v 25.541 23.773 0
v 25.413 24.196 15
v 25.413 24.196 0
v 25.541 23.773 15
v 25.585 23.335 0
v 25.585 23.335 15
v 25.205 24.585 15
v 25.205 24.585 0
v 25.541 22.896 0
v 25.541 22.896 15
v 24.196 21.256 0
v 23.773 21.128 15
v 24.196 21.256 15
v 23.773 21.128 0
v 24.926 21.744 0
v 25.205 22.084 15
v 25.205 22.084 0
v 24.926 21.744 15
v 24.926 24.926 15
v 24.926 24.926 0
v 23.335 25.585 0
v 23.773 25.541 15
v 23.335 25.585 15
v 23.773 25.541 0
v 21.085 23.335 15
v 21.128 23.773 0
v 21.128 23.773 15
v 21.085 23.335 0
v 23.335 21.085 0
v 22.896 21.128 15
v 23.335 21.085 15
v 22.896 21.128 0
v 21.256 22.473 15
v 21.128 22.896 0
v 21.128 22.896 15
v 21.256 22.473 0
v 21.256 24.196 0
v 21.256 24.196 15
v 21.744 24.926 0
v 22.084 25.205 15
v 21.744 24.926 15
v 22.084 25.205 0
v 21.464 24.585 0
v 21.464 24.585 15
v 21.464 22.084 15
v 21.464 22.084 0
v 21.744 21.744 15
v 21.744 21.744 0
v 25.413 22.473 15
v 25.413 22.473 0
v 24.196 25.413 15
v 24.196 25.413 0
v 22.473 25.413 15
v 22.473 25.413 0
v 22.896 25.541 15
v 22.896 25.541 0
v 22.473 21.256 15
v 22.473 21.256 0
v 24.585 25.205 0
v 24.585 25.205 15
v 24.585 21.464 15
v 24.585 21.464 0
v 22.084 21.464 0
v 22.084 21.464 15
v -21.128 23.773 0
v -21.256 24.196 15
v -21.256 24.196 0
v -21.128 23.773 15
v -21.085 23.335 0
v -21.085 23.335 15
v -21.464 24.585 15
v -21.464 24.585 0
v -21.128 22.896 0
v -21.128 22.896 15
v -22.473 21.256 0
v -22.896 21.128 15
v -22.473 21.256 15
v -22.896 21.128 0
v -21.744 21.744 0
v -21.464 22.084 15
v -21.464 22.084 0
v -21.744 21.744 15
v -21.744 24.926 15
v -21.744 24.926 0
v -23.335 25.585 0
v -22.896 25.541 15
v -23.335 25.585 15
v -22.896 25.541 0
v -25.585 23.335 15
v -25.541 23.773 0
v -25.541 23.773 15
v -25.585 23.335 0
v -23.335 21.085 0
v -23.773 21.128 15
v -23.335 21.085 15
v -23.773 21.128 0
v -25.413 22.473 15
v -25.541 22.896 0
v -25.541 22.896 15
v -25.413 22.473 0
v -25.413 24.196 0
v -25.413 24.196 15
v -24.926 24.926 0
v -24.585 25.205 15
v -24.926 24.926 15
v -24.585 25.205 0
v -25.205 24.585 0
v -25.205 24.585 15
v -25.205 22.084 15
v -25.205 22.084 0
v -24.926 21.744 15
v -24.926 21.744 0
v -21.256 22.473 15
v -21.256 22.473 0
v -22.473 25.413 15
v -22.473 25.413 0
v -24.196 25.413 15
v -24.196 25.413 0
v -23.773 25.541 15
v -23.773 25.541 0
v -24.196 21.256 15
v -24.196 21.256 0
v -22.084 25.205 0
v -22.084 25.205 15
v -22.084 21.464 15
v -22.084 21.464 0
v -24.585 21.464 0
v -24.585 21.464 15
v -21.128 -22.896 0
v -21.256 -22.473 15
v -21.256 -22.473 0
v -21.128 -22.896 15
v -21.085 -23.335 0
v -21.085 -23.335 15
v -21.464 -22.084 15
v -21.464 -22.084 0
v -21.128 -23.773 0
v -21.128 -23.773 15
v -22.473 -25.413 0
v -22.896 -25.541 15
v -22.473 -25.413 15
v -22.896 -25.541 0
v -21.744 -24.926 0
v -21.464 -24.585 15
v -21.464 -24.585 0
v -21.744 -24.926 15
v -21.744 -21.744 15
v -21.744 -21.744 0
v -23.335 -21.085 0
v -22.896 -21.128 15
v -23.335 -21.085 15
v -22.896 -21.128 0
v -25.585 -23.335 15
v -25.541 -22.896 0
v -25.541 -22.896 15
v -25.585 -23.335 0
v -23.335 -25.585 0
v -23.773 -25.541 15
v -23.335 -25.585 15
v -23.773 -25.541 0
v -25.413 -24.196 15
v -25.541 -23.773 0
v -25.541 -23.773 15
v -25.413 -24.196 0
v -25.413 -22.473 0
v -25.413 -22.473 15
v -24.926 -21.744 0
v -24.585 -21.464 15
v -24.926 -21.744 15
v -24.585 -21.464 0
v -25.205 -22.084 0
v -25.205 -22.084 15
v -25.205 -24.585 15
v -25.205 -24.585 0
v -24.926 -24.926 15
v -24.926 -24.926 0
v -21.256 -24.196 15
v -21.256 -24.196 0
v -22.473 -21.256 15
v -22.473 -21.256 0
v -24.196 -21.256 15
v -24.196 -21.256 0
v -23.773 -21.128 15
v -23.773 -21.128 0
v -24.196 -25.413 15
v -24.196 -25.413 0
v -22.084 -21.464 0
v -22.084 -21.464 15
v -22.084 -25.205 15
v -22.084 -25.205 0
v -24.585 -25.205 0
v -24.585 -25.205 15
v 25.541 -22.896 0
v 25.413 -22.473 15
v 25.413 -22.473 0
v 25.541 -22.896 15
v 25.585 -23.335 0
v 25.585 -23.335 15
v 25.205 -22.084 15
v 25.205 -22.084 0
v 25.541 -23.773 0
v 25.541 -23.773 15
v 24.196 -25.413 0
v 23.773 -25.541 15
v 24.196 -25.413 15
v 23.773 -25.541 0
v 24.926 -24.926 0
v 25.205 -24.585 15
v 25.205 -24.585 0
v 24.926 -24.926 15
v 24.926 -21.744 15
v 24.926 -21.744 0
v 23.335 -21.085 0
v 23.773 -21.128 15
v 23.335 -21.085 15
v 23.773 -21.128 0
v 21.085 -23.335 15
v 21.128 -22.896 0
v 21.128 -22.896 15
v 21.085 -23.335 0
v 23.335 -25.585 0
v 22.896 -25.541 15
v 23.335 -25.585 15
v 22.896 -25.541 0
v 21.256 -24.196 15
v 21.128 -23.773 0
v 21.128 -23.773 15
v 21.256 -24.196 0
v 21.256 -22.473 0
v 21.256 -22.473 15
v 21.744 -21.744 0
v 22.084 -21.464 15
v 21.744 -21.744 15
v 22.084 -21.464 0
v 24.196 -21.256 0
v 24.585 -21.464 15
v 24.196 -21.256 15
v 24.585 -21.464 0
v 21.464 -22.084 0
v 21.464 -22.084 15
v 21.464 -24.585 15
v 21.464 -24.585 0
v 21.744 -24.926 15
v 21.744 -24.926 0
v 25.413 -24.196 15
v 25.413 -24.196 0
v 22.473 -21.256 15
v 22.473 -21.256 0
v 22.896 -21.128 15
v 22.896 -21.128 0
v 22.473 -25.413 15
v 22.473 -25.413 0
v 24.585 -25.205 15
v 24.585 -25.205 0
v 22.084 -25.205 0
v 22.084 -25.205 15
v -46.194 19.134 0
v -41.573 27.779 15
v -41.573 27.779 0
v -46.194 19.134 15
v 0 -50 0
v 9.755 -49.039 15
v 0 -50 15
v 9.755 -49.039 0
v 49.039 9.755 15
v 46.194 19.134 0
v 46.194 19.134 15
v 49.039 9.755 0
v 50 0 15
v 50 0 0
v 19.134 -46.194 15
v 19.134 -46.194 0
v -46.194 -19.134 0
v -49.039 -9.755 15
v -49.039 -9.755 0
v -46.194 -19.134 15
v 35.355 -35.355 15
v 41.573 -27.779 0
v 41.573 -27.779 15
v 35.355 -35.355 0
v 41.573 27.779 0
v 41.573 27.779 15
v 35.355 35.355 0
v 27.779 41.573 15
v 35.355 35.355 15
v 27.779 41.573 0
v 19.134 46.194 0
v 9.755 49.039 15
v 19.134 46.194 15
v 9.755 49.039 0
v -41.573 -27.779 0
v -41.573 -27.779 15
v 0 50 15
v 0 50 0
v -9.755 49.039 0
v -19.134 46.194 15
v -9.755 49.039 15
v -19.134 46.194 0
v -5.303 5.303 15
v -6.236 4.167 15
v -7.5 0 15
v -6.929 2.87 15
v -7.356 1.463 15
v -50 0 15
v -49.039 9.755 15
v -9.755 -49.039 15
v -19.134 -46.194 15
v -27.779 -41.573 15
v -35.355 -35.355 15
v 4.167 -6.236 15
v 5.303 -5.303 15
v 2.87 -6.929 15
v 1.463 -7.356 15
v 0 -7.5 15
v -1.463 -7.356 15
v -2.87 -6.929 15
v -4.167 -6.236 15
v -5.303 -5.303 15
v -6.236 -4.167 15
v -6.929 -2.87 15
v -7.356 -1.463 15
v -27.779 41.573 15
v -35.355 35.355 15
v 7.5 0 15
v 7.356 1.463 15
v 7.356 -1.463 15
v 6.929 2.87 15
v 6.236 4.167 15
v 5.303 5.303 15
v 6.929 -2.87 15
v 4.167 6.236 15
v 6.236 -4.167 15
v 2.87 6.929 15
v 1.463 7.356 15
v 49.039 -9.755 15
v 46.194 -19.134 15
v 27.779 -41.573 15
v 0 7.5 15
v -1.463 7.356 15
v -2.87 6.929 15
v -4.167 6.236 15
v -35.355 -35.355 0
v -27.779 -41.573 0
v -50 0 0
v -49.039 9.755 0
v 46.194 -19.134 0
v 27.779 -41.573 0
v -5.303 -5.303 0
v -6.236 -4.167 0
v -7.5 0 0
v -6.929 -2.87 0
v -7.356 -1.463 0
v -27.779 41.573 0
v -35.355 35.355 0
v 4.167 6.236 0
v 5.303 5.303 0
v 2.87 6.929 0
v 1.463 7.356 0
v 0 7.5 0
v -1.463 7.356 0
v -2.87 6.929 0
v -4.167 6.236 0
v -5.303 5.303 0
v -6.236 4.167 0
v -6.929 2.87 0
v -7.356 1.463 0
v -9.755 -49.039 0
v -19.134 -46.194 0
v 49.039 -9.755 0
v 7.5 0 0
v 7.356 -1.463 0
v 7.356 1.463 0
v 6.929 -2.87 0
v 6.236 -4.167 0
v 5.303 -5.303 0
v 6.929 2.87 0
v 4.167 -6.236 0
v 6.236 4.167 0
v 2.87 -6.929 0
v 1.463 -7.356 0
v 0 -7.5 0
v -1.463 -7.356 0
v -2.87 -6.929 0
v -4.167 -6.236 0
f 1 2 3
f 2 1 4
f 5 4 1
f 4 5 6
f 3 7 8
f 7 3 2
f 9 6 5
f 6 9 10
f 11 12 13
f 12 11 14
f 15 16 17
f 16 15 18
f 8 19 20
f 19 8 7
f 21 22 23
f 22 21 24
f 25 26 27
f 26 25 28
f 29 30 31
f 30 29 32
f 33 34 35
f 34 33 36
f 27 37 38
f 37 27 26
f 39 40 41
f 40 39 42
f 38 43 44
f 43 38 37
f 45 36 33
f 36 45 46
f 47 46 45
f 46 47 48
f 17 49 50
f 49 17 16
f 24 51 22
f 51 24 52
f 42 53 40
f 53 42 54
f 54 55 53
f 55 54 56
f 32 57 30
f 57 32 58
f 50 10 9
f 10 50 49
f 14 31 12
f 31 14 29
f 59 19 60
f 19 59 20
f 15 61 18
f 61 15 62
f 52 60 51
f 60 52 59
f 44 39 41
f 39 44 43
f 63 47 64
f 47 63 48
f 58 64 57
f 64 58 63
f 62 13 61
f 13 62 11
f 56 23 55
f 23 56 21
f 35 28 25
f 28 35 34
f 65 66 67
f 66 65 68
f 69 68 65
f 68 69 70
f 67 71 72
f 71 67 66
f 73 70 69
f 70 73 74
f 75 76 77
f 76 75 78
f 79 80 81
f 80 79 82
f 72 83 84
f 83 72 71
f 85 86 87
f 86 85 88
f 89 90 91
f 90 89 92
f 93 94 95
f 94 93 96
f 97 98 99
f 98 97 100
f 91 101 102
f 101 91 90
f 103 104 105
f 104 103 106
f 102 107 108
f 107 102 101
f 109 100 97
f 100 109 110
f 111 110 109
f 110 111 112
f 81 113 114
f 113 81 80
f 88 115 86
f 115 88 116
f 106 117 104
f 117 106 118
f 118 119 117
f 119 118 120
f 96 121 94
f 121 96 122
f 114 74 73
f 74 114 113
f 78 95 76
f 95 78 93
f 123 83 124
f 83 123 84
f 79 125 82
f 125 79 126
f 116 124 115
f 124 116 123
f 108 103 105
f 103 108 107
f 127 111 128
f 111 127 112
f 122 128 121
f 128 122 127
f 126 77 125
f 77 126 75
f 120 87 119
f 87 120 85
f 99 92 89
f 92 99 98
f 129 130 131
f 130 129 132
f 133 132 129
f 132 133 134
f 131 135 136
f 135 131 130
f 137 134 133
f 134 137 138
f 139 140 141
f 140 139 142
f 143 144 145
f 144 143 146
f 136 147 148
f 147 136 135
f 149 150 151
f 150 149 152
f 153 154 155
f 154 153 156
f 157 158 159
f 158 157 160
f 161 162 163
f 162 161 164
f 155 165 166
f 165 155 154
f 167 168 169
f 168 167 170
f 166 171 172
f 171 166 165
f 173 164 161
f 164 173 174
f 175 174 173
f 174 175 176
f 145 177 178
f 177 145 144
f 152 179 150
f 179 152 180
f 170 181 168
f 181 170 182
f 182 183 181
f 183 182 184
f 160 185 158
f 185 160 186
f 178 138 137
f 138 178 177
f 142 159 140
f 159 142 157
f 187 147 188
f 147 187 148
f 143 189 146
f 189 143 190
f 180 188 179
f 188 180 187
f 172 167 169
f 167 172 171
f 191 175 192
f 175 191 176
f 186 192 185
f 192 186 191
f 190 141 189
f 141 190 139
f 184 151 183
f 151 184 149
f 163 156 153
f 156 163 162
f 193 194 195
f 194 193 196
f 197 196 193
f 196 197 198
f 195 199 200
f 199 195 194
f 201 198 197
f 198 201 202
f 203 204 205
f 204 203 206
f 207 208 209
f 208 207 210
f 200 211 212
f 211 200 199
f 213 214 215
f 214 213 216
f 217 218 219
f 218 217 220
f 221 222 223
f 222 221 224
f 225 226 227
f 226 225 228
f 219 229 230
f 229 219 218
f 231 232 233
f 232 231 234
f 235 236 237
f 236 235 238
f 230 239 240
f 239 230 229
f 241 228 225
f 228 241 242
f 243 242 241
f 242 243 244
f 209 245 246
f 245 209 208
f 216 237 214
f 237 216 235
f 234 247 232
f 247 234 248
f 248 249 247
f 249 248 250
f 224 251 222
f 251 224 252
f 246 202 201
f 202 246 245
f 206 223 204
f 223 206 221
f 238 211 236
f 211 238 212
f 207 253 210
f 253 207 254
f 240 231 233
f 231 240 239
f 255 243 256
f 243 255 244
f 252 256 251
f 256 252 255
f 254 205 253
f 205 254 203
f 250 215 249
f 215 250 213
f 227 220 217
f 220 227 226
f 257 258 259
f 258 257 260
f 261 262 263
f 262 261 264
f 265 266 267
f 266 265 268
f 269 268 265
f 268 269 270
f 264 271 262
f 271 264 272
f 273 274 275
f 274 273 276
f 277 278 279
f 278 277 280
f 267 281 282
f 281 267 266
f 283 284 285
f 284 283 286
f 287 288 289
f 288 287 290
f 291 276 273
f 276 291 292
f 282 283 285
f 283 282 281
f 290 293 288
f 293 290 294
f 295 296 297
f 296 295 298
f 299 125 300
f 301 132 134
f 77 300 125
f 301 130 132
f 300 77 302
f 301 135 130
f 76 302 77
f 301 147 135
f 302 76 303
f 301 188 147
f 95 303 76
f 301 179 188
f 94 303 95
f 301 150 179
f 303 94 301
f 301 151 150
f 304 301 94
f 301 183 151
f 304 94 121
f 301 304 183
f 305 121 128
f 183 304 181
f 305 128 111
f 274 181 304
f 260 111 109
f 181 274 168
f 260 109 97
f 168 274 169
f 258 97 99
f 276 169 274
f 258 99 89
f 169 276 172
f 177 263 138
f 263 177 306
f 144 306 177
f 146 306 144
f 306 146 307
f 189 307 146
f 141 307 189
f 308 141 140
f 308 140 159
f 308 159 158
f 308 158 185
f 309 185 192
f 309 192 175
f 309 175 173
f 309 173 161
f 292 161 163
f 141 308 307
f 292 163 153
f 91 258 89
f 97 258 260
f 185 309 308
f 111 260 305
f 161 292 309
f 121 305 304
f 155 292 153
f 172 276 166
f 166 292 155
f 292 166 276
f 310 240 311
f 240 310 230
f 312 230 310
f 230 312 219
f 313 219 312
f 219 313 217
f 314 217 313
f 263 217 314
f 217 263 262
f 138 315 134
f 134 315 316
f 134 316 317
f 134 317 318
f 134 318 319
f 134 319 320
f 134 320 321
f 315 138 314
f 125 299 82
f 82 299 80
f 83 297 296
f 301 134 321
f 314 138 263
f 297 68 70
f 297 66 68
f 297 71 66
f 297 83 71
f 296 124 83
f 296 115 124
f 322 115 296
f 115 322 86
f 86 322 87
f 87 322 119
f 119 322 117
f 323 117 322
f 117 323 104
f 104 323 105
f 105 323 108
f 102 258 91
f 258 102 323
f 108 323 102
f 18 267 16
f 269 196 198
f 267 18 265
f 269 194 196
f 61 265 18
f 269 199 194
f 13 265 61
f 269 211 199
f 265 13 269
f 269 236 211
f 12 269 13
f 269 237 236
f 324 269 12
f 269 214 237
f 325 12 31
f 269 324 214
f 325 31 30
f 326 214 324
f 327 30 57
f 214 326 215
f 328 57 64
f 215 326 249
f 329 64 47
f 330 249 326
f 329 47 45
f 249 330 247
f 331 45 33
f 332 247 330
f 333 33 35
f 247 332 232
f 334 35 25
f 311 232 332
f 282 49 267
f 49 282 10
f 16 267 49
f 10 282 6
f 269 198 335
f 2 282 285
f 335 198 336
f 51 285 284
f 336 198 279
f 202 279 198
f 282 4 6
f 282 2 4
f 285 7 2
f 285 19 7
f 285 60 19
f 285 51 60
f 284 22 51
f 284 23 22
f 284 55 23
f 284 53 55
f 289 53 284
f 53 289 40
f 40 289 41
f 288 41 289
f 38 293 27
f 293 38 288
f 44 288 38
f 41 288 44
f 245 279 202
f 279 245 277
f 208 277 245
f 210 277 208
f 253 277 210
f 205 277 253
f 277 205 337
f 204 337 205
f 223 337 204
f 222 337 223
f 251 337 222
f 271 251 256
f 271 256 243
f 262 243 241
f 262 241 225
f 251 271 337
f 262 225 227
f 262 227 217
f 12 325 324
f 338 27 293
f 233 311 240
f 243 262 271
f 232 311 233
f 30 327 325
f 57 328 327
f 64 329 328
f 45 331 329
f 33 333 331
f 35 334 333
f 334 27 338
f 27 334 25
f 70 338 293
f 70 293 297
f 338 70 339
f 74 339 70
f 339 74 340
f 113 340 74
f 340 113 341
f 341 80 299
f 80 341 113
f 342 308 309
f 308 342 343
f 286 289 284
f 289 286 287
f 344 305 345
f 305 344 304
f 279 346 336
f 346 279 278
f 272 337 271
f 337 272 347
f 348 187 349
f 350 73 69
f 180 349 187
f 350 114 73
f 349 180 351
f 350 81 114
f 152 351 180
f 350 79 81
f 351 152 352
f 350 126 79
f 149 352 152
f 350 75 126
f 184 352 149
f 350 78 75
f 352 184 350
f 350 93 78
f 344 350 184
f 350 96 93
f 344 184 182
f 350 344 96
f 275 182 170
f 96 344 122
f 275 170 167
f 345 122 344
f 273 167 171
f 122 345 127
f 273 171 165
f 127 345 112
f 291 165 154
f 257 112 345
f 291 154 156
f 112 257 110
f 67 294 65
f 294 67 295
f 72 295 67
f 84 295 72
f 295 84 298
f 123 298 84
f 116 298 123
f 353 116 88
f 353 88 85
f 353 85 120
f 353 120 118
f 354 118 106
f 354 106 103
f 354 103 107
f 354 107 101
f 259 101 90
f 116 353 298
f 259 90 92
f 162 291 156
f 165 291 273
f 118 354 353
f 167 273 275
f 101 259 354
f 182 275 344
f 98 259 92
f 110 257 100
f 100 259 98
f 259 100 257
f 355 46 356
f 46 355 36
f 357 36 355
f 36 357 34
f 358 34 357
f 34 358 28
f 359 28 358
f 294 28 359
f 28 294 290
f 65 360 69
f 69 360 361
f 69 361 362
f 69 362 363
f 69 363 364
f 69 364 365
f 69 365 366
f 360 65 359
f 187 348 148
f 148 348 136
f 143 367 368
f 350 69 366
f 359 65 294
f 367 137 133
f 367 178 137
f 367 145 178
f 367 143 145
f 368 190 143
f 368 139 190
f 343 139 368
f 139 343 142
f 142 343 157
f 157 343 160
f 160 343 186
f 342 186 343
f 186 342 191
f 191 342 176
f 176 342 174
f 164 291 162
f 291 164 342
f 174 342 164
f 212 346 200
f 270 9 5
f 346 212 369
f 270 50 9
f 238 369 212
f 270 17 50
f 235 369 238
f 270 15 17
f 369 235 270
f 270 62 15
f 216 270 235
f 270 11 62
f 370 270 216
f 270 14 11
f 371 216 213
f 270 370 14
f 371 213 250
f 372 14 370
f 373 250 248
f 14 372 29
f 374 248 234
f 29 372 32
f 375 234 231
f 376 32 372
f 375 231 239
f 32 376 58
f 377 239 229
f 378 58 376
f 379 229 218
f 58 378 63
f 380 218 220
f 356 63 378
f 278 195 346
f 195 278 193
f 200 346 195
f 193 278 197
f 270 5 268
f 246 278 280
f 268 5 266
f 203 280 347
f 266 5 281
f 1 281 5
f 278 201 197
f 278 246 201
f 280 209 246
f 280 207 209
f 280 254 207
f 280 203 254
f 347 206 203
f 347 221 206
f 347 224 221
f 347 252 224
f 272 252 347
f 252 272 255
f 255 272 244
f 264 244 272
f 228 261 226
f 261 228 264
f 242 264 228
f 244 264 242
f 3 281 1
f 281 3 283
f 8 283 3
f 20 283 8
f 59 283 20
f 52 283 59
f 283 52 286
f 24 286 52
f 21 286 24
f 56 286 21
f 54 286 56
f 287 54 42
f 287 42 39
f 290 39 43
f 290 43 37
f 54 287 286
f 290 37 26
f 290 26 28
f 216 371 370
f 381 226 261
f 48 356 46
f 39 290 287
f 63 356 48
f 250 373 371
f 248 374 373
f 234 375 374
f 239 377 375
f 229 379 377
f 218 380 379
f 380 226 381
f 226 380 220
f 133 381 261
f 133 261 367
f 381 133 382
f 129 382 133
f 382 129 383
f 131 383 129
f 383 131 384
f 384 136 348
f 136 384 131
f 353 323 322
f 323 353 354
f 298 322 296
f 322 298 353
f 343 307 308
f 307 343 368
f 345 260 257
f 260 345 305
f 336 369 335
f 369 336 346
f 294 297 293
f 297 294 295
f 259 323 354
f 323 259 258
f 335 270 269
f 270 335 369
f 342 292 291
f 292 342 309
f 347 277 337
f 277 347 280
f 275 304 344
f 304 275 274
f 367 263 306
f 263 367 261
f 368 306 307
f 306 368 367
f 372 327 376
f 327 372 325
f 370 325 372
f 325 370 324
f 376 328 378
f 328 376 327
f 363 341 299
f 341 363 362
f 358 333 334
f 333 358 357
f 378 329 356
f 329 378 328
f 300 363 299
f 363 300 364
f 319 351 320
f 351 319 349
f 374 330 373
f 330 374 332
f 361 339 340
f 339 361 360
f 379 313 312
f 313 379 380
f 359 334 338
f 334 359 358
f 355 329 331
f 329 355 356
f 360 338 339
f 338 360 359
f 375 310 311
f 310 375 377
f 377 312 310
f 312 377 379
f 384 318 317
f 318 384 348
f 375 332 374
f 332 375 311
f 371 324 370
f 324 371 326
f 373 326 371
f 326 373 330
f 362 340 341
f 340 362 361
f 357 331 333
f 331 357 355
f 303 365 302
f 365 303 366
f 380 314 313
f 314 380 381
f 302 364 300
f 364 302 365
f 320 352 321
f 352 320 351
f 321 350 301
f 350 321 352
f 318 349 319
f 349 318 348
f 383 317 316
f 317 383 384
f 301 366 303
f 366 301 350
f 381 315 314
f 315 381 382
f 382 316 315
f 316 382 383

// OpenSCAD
$fn = 32;

// ----------------------------------------------------------------------
// Flange Ø100 x 15
// 4 holes on a Ø66 bolt circle, bolted joints
// ----------------------------------------------------------------------

// --- parameters (mm) ---
flange_d = 100;  // outside diameter of the flange
thickness = 15;  // flange thickness
holes = 4;       // number of bolt holes
pcd = 66;        // bolt circle diameter
start_deg = 45;  // angle of the first hole, from +X
hole_d = 4.5;    // bolt hole diameter
bore_d = 15;     // central through bore
hub_d = 27;      // hub outside diameter
hub_h = 0;       // hub height above the flange face (0 = no hub)

// --- derived feature positions (mm) ---
height = thickness + hub_h;  // = 15   overall height of the part
pcd_r = pcd / 2;             // = 33   bolt circle radius
hole_step = 360 / holes;     // = 90   angular pitch
feature_centers = [
  [pcd_r * cos(start_deg + 0 * hole_step), pcd_r * sin(start_deg + 0 * hole_step)],
  [pcd_r * cos(start_deg + 1 * hole_step), pcd_r * sin(start_deg + 1 * hole_step)],
  [pcd_r * cos(start_deg + 2 * hole_step), pcd_r * sin(start_deg + 2 * hole_step)],
  [pcd_r * cos(start_deg + 3 * hole_step), pcd_r * sin(start_deg + 3 * hole_step)]
];   // bolt hole centres on the pitch circle

// flange disc, every hole and the bore cut straight through
difference() {
  union() {
    cylinder(d = flange_d, h = thickness);
  }
  translate([0, 0, -1]) cylinder(d = bore_d, h = height + 2);  // bore, through
  for (centre = feature_centers)
    translate([centre[0], centre[1], -1]) cylinder(d = hole_d, h = thickness + 2);
}
